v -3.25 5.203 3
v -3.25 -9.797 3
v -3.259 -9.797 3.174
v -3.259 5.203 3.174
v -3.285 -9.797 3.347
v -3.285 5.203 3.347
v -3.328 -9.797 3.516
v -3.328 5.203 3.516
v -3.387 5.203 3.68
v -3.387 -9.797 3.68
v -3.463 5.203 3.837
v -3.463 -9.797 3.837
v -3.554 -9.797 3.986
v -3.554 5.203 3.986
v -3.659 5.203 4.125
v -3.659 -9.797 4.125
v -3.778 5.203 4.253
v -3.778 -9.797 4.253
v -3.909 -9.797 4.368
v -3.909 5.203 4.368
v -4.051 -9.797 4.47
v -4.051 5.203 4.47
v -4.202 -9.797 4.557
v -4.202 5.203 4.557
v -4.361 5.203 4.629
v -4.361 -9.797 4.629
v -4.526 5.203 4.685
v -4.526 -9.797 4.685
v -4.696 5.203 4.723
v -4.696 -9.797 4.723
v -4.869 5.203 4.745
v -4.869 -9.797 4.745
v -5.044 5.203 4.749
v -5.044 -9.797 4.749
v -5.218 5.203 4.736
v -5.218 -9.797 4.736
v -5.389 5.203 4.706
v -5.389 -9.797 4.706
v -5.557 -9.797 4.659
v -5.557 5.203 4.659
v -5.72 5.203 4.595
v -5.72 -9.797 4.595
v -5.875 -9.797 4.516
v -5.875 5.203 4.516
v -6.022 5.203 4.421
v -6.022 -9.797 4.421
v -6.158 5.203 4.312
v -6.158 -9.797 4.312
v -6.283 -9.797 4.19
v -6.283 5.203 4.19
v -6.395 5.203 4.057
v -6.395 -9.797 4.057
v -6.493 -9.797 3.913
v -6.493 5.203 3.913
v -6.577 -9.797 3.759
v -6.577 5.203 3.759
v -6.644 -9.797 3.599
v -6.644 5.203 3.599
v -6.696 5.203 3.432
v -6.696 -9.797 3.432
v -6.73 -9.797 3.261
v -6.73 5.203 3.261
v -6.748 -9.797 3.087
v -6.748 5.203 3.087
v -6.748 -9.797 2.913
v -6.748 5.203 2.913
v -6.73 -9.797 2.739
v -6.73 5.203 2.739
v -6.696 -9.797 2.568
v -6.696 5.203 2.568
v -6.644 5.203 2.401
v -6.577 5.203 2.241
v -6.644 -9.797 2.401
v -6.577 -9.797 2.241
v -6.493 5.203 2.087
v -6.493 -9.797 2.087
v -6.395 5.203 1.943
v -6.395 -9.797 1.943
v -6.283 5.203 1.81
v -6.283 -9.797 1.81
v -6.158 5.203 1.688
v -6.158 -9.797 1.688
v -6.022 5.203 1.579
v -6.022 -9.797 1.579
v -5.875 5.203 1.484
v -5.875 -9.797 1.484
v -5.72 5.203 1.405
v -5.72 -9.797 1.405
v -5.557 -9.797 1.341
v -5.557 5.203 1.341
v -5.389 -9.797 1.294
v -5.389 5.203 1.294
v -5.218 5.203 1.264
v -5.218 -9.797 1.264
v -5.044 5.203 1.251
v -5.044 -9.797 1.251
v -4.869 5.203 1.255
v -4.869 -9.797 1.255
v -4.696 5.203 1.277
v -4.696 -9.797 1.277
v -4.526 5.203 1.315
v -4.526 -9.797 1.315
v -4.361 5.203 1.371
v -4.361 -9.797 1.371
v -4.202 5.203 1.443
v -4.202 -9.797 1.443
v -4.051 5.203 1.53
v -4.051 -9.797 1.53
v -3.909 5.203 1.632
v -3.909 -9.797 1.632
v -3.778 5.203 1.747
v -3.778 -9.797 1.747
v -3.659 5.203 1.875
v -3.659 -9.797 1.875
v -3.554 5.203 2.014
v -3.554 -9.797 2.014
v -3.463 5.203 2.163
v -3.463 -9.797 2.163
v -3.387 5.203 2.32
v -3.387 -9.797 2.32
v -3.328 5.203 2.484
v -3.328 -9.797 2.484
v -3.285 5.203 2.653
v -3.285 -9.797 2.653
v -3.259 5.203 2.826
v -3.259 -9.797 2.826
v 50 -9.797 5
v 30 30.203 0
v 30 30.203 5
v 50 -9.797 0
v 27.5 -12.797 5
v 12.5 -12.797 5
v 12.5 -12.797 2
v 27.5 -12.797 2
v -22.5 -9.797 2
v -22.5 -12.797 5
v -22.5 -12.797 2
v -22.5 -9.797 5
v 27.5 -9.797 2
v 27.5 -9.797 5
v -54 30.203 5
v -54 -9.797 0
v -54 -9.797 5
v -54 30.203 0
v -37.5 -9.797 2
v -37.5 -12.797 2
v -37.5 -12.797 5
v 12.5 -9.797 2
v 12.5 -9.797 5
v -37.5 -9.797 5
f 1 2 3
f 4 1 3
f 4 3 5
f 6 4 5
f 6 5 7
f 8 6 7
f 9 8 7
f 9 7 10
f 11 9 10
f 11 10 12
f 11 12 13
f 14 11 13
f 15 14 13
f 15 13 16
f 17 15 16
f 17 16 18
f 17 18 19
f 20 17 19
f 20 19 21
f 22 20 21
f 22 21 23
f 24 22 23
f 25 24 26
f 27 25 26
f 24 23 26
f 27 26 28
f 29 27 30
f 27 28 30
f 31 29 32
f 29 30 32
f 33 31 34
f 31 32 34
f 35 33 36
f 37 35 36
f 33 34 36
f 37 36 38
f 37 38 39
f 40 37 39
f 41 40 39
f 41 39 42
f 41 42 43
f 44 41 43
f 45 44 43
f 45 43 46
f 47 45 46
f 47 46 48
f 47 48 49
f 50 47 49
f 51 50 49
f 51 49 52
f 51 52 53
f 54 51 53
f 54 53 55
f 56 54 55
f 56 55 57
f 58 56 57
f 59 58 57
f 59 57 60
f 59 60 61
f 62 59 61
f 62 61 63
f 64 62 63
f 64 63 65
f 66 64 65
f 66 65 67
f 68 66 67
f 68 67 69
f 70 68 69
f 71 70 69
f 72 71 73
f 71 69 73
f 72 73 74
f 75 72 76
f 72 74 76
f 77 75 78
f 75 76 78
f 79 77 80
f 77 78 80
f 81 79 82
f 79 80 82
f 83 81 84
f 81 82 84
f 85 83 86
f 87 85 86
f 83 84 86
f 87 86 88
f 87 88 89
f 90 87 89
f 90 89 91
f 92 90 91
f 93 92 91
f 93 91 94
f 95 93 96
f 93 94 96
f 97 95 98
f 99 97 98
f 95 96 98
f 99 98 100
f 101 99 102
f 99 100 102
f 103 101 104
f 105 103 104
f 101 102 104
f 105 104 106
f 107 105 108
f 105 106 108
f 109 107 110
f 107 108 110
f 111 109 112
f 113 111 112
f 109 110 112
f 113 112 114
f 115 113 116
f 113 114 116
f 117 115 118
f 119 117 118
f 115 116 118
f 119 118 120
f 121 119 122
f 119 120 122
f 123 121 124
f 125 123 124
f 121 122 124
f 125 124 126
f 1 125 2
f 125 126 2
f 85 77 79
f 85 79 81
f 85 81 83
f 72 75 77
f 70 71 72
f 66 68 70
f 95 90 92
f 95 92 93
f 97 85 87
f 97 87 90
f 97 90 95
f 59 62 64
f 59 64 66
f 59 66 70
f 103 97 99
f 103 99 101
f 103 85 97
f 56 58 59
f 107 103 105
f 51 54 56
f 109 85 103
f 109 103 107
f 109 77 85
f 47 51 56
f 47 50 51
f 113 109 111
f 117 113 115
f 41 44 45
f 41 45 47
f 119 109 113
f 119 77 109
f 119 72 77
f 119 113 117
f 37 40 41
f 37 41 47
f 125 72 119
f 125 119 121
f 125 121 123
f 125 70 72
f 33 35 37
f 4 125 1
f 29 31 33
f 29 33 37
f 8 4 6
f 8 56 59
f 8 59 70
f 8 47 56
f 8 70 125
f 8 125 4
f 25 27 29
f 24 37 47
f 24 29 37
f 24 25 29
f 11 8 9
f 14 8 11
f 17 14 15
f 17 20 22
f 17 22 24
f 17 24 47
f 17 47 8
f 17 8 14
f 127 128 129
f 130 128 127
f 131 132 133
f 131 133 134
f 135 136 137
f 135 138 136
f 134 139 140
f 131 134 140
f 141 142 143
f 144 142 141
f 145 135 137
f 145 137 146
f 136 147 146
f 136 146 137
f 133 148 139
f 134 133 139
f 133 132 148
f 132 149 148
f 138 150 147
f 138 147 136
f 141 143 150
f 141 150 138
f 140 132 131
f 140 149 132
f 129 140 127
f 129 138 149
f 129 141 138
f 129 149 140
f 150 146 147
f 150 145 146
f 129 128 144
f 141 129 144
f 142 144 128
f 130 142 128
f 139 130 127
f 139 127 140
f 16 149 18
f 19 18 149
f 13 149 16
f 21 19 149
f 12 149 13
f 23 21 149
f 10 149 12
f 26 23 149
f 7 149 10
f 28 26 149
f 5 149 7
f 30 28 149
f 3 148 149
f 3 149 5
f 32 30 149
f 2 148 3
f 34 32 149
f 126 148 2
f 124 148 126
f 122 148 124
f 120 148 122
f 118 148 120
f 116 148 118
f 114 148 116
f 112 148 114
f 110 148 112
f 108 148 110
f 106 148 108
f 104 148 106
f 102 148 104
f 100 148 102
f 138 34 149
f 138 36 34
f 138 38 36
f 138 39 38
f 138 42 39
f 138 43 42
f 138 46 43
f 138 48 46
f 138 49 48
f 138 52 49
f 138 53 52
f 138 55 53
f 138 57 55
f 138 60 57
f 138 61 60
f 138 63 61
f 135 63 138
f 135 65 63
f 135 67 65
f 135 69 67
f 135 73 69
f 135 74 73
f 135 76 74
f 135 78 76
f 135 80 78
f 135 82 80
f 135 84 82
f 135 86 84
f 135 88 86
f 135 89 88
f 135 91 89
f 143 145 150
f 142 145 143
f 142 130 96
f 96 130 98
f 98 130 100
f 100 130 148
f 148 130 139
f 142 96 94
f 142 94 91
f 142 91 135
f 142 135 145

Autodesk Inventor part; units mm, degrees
ref_plane "YZ Plane" through (0, 0, 0) normal (1, 0, 0) x (0, 1, 0)
ref_plane "XZ Plane" through (0, 0, 0) normal (0, 1, 0) x (-1, 0, 0)
ref_plane "XY Plane" through (0, 0, 0) normal (0, 0, 1) x (1, 0, 0)
sketch "Sketch1" plane through (0, 0, 0) normal (0, 0, 1) x (1, 0, 0)
  line L0 (0, -9.797) -> (50, -9.797)
  line L1 (0, -9.797) -> (-50, -9.797)
  line L2 (50, -9.797) -> (30, -9.797)
  line L3 (30, 30.203) -> (50, -9.797)
  line L4 (-50, 30.203) -> (30, 30.203)
  line L5 (-50, -9.797) -> (-54, -9.797)
  line L6 (-50, 30.203) -> (-54, 30.203)
  line L7 (-54, -9.797) -> (-54, 30.203)
  point P0 (0, 0)
  dimension "d4" = 20
  dimension "d5" = 40
  dimension "d27" = 104
  dimension "d29" = 84
extrude "Extrusion3" add sketch "Sketch1" along normal blind 5
sketch "Sketch3" plane through (-54, -9.797, 0) normal (0, -1, 0) x (1, 0, 0)
  line L0 (104, 0) -> (104, 5) construction
  line L1 (104, 5) -> (81.5, 5) construction
  line L2 (84, 5) -> (0, 5) construction
  line L3 (81.5, 5) -> (66.5, 5)
  line L4 (66.5, 5) -> (66.5, 2)
  line L5 (66.5, 2) -> (81.5, 2)
  line L6 (81.5, 2) -> (81.5, 5)
  line L7 (66.5, 5) -> (66.5, 3) construction
  line L8 (31.5, 2) -> (16.5, 2)
  line L9 (16.5, 2) -> (16.5, 5)
  line L10 (16.5, 5) -> (31.5, 5)
  line L11 (31.5, 5) -> (31.5, 2)
  circle A0 centre (49, 3) radius 1.75
  point P0 (54, 0)
  dimension "d32" = 22.5
  dimension "d33" = 15
  dimension "d34" = 3
  dimension "d41" = 15
  dimension "d42" = 3
  dimension "d44" = 3.5
  dimension "d45" = 15.75
  dimension "d46" = 17.5
extrude "Extrusion4" add sketch "Sketch3" along normal blind 3 contours L6 L5 L4 L3 | L8 L9 L10 L11
extrude "Extrusion5" cut sketch "Sketch3" against normal blind 15 contours A0
equation "\"d41\" = d33"
equation "\"d42\" = d34"
properties part number "latera_trapezio_agitador"
